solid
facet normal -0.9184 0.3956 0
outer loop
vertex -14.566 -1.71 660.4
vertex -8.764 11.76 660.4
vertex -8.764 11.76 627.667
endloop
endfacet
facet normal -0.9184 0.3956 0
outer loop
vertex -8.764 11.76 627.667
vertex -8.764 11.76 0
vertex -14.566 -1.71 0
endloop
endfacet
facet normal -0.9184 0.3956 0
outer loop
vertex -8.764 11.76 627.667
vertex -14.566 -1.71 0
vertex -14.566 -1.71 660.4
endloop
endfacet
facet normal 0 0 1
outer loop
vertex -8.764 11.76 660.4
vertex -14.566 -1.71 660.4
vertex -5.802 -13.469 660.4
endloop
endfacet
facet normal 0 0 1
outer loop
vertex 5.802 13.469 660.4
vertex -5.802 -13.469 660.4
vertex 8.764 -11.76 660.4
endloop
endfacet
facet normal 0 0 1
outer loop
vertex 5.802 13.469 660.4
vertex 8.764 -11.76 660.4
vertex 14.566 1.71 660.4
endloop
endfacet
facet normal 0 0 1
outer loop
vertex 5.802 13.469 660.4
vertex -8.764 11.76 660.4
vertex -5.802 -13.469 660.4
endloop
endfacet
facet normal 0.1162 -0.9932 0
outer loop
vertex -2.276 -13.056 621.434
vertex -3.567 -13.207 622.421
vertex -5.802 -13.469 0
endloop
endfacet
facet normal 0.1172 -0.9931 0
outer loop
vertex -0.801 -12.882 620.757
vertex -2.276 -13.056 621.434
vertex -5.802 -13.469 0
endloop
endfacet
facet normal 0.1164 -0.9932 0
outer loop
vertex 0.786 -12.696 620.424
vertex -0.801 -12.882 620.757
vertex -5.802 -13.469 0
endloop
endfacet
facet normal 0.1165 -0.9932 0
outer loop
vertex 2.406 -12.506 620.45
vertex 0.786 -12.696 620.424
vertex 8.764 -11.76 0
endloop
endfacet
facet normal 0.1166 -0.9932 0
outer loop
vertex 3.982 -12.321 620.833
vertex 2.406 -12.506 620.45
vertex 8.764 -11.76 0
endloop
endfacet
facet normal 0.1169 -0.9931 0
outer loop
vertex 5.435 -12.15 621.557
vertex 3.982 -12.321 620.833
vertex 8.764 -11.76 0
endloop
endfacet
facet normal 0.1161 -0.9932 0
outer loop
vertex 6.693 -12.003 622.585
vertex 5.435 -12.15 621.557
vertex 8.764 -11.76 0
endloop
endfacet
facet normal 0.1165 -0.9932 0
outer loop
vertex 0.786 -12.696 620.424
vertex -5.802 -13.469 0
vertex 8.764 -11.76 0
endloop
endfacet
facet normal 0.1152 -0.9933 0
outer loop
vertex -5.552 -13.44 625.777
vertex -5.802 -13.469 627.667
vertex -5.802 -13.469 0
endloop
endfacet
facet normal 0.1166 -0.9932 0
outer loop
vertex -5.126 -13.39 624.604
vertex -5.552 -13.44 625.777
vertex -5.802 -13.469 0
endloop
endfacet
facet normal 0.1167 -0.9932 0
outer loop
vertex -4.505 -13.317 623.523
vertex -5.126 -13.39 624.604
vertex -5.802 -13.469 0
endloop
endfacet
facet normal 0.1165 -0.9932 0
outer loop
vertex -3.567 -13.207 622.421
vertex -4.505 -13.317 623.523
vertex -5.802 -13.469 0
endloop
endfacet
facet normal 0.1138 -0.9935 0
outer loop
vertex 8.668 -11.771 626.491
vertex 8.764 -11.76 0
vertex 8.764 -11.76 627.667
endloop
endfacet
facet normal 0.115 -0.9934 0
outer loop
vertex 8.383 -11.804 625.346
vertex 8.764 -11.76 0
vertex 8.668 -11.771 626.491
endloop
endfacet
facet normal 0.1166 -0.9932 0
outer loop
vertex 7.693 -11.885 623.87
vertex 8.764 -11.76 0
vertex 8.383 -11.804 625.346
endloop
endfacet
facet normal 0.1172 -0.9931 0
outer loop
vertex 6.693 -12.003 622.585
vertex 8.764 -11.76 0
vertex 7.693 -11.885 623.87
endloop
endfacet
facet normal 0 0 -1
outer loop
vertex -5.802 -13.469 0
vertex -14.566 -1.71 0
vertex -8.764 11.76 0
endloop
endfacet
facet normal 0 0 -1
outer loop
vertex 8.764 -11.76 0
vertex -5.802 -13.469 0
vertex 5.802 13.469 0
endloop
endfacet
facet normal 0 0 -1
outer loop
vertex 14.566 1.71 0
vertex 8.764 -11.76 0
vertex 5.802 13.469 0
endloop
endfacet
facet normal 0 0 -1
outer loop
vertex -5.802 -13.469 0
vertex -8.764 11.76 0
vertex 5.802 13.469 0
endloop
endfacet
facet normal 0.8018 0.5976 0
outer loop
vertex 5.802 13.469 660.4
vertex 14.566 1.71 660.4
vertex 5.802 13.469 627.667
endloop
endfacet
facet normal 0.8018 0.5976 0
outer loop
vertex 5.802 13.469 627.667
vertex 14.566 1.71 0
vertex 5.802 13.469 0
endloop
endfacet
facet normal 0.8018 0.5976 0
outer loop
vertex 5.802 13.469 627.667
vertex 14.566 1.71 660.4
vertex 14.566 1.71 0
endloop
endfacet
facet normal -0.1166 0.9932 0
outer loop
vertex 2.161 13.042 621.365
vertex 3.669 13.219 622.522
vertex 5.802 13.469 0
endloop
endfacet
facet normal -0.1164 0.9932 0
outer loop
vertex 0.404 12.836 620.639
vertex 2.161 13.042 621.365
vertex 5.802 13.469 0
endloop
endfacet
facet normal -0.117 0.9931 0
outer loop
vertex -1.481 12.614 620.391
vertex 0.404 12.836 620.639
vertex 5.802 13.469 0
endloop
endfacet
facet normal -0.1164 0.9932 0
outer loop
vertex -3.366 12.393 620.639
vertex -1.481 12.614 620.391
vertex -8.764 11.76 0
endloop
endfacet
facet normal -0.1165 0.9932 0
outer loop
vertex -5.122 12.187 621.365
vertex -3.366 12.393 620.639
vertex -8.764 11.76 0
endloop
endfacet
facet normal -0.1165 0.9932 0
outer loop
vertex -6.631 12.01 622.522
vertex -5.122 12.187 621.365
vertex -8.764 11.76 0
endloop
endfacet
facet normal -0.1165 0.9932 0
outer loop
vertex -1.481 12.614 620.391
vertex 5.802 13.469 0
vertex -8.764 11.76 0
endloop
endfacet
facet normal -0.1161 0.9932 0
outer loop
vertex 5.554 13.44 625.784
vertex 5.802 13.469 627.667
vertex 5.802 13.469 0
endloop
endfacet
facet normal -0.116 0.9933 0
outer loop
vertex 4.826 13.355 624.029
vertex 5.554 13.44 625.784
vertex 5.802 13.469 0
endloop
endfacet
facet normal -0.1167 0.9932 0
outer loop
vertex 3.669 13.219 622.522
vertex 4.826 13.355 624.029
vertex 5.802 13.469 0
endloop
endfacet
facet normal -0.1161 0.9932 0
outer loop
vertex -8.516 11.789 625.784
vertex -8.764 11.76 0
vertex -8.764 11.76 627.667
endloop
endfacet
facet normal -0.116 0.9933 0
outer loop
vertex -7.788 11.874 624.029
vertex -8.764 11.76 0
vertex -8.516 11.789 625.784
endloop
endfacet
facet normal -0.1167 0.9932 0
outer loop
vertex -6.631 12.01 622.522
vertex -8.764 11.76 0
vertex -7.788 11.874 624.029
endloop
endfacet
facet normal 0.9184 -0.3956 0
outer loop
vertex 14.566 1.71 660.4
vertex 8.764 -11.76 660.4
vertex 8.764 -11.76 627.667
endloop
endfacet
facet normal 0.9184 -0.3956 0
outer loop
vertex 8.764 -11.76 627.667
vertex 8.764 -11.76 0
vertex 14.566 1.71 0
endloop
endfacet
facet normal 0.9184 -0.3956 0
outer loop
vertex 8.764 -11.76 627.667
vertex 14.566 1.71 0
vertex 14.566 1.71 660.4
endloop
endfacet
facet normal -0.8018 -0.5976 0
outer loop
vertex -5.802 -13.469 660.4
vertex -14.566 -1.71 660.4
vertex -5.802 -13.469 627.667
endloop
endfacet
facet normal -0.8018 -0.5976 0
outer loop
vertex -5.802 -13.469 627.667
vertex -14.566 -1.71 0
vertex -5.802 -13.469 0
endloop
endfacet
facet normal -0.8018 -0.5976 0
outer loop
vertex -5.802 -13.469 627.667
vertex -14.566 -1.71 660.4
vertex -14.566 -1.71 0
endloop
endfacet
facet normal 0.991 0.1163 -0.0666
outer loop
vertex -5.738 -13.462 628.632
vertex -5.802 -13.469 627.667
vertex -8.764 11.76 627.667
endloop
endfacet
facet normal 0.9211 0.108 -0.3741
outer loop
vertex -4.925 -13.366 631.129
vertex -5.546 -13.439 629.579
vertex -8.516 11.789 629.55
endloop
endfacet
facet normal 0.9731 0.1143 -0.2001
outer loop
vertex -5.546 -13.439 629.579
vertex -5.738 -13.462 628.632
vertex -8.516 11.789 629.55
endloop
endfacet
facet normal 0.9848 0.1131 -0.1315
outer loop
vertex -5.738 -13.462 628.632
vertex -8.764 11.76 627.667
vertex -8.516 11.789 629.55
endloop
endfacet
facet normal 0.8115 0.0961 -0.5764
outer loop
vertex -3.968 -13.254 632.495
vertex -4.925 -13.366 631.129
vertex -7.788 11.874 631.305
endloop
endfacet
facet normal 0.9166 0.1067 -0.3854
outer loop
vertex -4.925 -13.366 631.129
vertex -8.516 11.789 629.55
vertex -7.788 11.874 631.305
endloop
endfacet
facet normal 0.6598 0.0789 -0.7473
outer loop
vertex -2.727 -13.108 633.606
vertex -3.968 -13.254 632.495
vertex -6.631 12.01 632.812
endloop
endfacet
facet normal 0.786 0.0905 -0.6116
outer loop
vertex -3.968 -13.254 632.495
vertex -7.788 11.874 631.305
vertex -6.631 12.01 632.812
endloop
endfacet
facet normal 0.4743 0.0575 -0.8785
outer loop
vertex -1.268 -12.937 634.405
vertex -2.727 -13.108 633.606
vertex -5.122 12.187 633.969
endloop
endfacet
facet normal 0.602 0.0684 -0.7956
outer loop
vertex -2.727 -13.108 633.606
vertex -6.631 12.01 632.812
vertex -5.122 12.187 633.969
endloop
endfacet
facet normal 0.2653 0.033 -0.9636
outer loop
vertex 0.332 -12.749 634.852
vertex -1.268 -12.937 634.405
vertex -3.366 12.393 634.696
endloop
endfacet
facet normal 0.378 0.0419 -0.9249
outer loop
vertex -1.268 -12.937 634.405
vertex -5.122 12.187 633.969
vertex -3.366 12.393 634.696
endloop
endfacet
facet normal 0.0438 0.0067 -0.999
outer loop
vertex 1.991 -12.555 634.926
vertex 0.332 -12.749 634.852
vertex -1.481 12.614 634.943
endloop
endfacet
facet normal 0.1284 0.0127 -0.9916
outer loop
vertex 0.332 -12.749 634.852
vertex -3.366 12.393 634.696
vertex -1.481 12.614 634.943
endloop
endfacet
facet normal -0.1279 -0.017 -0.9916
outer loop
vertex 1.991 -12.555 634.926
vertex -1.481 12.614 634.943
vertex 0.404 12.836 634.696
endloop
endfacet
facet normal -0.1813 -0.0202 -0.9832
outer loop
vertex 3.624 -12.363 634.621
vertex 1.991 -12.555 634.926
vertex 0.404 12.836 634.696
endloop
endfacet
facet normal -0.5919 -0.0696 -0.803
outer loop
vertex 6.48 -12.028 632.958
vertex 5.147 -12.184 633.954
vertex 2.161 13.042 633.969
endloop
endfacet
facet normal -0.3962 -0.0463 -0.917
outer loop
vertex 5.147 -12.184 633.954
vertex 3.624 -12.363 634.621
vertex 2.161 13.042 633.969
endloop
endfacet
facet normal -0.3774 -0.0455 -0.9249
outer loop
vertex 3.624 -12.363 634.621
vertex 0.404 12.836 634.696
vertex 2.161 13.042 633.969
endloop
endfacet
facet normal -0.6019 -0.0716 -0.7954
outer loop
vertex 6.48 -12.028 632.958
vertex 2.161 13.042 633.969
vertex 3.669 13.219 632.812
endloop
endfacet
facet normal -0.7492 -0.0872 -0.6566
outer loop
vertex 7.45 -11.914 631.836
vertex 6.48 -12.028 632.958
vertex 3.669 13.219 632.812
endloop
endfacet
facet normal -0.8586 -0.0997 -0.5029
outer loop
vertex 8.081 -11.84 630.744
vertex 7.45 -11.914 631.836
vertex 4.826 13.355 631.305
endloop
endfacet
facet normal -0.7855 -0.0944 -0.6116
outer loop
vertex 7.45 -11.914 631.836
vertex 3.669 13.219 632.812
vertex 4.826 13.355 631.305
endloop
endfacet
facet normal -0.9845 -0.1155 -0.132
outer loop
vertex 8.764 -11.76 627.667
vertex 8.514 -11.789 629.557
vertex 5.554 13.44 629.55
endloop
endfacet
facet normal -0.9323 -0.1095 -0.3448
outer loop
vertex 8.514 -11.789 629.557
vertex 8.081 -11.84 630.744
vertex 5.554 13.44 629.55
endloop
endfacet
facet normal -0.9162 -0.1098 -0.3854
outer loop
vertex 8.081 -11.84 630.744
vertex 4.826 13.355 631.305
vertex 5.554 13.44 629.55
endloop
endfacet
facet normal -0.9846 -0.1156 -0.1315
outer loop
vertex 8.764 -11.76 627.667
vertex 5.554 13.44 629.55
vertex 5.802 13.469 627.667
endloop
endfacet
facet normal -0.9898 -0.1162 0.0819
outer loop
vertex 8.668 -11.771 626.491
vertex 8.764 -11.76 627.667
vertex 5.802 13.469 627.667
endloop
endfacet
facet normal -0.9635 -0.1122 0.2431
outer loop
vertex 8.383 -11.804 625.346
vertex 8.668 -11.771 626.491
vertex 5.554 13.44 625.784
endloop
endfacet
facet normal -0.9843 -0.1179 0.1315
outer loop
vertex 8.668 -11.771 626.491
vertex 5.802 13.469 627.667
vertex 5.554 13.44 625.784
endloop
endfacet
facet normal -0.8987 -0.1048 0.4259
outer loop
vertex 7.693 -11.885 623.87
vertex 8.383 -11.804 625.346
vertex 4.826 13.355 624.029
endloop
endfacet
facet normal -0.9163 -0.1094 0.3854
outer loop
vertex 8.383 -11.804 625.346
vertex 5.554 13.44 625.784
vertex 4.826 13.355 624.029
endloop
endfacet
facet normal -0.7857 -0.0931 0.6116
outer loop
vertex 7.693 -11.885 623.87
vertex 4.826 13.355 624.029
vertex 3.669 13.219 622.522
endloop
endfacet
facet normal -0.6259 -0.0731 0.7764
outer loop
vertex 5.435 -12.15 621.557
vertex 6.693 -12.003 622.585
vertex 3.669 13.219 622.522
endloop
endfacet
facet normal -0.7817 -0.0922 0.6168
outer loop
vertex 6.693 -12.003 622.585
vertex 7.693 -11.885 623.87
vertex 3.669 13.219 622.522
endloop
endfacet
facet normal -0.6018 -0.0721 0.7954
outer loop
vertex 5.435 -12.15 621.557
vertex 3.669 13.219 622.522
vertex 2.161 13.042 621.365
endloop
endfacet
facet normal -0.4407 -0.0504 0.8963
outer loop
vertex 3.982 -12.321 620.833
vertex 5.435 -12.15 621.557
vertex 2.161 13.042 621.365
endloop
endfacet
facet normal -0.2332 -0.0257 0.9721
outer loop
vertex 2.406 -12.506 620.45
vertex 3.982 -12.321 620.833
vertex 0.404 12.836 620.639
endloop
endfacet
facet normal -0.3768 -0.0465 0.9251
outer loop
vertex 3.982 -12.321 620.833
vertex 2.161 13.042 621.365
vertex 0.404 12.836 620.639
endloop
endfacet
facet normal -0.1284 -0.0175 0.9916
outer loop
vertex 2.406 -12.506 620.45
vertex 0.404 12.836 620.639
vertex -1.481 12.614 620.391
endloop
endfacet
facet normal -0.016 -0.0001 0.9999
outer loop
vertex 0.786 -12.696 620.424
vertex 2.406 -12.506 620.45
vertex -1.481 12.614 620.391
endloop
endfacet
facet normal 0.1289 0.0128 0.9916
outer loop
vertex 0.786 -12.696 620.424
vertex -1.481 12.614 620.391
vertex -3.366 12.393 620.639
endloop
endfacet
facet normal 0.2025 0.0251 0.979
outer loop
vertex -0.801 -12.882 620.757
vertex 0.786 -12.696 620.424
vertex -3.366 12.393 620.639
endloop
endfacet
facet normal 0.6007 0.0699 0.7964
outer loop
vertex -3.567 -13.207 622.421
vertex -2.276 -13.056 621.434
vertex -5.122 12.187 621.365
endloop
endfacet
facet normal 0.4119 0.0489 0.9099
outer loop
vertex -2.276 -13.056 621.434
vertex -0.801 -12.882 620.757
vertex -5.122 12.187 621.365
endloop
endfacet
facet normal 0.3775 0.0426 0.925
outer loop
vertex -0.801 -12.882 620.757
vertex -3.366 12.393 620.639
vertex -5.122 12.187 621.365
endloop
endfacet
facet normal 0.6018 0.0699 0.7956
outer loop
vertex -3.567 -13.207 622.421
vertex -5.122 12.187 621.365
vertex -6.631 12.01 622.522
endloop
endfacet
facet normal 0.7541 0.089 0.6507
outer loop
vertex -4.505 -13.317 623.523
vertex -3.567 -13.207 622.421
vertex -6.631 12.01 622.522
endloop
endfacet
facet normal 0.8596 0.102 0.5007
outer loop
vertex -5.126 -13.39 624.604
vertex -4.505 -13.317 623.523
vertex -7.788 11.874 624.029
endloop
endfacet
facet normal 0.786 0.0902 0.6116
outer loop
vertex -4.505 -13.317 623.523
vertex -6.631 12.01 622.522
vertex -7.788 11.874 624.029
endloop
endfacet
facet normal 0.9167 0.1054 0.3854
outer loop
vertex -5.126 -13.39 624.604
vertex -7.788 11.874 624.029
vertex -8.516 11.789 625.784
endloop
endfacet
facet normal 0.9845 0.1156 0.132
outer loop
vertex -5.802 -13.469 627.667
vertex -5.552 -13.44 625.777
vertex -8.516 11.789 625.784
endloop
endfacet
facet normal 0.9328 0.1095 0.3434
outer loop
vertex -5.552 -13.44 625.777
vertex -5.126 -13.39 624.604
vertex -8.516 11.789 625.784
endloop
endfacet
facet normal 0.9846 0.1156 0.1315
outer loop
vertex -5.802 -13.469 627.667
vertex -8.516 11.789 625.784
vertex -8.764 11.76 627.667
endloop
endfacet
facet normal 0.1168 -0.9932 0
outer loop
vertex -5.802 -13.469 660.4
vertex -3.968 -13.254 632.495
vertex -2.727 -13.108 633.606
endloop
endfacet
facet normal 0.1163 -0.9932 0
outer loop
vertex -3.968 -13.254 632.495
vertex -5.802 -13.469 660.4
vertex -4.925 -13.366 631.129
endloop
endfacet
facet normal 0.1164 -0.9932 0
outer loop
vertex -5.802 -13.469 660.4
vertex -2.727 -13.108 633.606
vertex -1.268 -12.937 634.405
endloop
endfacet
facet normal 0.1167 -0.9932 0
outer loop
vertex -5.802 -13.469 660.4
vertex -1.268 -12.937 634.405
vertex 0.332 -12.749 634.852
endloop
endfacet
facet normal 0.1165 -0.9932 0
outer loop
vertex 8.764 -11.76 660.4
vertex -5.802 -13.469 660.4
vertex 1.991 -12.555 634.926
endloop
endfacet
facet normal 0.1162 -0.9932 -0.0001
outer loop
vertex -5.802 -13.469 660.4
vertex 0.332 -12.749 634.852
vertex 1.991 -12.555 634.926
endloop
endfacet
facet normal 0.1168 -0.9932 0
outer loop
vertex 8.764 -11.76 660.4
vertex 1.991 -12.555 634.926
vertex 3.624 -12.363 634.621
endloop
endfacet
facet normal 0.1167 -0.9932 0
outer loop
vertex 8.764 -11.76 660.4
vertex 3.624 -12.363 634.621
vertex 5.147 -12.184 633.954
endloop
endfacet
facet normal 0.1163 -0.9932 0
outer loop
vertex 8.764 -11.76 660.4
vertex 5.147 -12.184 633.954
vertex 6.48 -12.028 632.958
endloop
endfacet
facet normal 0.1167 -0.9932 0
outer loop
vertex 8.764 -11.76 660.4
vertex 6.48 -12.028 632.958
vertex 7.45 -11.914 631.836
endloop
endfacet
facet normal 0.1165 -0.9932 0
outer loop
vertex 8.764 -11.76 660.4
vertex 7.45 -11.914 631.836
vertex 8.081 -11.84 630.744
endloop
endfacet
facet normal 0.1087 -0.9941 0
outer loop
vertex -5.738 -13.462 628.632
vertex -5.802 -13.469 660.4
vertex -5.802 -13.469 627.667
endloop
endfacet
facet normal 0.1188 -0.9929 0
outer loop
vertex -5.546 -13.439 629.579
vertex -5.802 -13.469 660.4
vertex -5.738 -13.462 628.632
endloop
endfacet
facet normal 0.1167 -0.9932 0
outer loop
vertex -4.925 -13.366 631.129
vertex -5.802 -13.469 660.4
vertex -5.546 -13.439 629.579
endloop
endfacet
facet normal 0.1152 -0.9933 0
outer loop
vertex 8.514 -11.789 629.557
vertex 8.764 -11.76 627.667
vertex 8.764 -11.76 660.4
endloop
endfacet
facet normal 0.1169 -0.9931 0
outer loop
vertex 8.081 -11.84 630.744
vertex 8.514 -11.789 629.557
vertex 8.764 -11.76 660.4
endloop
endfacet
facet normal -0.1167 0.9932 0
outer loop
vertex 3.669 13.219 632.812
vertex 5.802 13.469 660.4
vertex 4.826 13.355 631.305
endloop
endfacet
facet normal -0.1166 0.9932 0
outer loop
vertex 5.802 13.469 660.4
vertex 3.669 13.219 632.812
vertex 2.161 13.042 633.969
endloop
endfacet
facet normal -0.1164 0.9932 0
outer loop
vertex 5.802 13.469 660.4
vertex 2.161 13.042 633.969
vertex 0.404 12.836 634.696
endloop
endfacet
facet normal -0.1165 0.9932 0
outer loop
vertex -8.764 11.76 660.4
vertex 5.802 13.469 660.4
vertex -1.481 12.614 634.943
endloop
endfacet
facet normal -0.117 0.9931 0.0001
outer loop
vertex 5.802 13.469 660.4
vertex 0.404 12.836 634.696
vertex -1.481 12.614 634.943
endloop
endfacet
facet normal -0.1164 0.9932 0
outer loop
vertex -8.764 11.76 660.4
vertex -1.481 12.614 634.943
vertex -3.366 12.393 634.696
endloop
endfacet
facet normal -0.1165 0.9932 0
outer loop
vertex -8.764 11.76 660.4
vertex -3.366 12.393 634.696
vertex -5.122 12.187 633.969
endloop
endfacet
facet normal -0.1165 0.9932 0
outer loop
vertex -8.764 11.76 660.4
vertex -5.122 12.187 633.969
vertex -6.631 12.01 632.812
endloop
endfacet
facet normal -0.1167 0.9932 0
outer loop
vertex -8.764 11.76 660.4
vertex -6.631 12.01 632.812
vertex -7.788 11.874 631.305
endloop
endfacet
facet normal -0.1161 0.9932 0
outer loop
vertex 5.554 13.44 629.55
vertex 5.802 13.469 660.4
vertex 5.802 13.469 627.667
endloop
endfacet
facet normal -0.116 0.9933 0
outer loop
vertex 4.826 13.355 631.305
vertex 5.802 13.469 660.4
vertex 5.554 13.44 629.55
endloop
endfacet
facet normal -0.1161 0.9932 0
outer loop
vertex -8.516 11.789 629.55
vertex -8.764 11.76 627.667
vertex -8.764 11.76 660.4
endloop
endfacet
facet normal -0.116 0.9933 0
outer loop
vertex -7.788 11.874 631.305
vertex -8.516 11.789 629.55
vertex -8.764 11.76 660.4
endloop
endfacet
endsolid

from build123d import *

# Parameters (mm, degrees)
BOSS_EXTRUDE1_DEPTH = 660.4
SKETCH2_RX          = 7.33298
SKETCH2_RY          = 7.27642549
CUT_EXTRUDE1_DEPTH  = 33.02


with BuildPart() as part:
    # Sketch1 → Boss-Extrude1 (new body)
    with BuildSketch(Plane.XY):
        Polygon((5.802204234, 13.469402687), (-8.763742784, 11.759557608), (-14.565947018, -1.709845079), (-5.802204234, -13.469402687), (8.763742784, -11.759557608), (14.565947018, 1.709845079), align=None)
    extrude(amount=BOSS_EXTRUDE1_DEPTH)

    # Sketch2 → Cut-Extrude1 (cut)
    with BuildSketch(Plane(origin=(-1.480769275, 12.614480148, 0), x_dir=(0.9931806044692795, 0.11658596358926146, 0), z_dir=(-0.11658596358926147, 0.9931806044692796, 0))):
        with Locations(Location((0, -627.66702), (0, 0, 180))):
            Ellipse(SKETCH2_RX, SKETCH2_RY)
    extrude(amount=-CUT_EXTRUDE1_DEPTH, mode=Mode.SUBTRACT)


solid = part.part
